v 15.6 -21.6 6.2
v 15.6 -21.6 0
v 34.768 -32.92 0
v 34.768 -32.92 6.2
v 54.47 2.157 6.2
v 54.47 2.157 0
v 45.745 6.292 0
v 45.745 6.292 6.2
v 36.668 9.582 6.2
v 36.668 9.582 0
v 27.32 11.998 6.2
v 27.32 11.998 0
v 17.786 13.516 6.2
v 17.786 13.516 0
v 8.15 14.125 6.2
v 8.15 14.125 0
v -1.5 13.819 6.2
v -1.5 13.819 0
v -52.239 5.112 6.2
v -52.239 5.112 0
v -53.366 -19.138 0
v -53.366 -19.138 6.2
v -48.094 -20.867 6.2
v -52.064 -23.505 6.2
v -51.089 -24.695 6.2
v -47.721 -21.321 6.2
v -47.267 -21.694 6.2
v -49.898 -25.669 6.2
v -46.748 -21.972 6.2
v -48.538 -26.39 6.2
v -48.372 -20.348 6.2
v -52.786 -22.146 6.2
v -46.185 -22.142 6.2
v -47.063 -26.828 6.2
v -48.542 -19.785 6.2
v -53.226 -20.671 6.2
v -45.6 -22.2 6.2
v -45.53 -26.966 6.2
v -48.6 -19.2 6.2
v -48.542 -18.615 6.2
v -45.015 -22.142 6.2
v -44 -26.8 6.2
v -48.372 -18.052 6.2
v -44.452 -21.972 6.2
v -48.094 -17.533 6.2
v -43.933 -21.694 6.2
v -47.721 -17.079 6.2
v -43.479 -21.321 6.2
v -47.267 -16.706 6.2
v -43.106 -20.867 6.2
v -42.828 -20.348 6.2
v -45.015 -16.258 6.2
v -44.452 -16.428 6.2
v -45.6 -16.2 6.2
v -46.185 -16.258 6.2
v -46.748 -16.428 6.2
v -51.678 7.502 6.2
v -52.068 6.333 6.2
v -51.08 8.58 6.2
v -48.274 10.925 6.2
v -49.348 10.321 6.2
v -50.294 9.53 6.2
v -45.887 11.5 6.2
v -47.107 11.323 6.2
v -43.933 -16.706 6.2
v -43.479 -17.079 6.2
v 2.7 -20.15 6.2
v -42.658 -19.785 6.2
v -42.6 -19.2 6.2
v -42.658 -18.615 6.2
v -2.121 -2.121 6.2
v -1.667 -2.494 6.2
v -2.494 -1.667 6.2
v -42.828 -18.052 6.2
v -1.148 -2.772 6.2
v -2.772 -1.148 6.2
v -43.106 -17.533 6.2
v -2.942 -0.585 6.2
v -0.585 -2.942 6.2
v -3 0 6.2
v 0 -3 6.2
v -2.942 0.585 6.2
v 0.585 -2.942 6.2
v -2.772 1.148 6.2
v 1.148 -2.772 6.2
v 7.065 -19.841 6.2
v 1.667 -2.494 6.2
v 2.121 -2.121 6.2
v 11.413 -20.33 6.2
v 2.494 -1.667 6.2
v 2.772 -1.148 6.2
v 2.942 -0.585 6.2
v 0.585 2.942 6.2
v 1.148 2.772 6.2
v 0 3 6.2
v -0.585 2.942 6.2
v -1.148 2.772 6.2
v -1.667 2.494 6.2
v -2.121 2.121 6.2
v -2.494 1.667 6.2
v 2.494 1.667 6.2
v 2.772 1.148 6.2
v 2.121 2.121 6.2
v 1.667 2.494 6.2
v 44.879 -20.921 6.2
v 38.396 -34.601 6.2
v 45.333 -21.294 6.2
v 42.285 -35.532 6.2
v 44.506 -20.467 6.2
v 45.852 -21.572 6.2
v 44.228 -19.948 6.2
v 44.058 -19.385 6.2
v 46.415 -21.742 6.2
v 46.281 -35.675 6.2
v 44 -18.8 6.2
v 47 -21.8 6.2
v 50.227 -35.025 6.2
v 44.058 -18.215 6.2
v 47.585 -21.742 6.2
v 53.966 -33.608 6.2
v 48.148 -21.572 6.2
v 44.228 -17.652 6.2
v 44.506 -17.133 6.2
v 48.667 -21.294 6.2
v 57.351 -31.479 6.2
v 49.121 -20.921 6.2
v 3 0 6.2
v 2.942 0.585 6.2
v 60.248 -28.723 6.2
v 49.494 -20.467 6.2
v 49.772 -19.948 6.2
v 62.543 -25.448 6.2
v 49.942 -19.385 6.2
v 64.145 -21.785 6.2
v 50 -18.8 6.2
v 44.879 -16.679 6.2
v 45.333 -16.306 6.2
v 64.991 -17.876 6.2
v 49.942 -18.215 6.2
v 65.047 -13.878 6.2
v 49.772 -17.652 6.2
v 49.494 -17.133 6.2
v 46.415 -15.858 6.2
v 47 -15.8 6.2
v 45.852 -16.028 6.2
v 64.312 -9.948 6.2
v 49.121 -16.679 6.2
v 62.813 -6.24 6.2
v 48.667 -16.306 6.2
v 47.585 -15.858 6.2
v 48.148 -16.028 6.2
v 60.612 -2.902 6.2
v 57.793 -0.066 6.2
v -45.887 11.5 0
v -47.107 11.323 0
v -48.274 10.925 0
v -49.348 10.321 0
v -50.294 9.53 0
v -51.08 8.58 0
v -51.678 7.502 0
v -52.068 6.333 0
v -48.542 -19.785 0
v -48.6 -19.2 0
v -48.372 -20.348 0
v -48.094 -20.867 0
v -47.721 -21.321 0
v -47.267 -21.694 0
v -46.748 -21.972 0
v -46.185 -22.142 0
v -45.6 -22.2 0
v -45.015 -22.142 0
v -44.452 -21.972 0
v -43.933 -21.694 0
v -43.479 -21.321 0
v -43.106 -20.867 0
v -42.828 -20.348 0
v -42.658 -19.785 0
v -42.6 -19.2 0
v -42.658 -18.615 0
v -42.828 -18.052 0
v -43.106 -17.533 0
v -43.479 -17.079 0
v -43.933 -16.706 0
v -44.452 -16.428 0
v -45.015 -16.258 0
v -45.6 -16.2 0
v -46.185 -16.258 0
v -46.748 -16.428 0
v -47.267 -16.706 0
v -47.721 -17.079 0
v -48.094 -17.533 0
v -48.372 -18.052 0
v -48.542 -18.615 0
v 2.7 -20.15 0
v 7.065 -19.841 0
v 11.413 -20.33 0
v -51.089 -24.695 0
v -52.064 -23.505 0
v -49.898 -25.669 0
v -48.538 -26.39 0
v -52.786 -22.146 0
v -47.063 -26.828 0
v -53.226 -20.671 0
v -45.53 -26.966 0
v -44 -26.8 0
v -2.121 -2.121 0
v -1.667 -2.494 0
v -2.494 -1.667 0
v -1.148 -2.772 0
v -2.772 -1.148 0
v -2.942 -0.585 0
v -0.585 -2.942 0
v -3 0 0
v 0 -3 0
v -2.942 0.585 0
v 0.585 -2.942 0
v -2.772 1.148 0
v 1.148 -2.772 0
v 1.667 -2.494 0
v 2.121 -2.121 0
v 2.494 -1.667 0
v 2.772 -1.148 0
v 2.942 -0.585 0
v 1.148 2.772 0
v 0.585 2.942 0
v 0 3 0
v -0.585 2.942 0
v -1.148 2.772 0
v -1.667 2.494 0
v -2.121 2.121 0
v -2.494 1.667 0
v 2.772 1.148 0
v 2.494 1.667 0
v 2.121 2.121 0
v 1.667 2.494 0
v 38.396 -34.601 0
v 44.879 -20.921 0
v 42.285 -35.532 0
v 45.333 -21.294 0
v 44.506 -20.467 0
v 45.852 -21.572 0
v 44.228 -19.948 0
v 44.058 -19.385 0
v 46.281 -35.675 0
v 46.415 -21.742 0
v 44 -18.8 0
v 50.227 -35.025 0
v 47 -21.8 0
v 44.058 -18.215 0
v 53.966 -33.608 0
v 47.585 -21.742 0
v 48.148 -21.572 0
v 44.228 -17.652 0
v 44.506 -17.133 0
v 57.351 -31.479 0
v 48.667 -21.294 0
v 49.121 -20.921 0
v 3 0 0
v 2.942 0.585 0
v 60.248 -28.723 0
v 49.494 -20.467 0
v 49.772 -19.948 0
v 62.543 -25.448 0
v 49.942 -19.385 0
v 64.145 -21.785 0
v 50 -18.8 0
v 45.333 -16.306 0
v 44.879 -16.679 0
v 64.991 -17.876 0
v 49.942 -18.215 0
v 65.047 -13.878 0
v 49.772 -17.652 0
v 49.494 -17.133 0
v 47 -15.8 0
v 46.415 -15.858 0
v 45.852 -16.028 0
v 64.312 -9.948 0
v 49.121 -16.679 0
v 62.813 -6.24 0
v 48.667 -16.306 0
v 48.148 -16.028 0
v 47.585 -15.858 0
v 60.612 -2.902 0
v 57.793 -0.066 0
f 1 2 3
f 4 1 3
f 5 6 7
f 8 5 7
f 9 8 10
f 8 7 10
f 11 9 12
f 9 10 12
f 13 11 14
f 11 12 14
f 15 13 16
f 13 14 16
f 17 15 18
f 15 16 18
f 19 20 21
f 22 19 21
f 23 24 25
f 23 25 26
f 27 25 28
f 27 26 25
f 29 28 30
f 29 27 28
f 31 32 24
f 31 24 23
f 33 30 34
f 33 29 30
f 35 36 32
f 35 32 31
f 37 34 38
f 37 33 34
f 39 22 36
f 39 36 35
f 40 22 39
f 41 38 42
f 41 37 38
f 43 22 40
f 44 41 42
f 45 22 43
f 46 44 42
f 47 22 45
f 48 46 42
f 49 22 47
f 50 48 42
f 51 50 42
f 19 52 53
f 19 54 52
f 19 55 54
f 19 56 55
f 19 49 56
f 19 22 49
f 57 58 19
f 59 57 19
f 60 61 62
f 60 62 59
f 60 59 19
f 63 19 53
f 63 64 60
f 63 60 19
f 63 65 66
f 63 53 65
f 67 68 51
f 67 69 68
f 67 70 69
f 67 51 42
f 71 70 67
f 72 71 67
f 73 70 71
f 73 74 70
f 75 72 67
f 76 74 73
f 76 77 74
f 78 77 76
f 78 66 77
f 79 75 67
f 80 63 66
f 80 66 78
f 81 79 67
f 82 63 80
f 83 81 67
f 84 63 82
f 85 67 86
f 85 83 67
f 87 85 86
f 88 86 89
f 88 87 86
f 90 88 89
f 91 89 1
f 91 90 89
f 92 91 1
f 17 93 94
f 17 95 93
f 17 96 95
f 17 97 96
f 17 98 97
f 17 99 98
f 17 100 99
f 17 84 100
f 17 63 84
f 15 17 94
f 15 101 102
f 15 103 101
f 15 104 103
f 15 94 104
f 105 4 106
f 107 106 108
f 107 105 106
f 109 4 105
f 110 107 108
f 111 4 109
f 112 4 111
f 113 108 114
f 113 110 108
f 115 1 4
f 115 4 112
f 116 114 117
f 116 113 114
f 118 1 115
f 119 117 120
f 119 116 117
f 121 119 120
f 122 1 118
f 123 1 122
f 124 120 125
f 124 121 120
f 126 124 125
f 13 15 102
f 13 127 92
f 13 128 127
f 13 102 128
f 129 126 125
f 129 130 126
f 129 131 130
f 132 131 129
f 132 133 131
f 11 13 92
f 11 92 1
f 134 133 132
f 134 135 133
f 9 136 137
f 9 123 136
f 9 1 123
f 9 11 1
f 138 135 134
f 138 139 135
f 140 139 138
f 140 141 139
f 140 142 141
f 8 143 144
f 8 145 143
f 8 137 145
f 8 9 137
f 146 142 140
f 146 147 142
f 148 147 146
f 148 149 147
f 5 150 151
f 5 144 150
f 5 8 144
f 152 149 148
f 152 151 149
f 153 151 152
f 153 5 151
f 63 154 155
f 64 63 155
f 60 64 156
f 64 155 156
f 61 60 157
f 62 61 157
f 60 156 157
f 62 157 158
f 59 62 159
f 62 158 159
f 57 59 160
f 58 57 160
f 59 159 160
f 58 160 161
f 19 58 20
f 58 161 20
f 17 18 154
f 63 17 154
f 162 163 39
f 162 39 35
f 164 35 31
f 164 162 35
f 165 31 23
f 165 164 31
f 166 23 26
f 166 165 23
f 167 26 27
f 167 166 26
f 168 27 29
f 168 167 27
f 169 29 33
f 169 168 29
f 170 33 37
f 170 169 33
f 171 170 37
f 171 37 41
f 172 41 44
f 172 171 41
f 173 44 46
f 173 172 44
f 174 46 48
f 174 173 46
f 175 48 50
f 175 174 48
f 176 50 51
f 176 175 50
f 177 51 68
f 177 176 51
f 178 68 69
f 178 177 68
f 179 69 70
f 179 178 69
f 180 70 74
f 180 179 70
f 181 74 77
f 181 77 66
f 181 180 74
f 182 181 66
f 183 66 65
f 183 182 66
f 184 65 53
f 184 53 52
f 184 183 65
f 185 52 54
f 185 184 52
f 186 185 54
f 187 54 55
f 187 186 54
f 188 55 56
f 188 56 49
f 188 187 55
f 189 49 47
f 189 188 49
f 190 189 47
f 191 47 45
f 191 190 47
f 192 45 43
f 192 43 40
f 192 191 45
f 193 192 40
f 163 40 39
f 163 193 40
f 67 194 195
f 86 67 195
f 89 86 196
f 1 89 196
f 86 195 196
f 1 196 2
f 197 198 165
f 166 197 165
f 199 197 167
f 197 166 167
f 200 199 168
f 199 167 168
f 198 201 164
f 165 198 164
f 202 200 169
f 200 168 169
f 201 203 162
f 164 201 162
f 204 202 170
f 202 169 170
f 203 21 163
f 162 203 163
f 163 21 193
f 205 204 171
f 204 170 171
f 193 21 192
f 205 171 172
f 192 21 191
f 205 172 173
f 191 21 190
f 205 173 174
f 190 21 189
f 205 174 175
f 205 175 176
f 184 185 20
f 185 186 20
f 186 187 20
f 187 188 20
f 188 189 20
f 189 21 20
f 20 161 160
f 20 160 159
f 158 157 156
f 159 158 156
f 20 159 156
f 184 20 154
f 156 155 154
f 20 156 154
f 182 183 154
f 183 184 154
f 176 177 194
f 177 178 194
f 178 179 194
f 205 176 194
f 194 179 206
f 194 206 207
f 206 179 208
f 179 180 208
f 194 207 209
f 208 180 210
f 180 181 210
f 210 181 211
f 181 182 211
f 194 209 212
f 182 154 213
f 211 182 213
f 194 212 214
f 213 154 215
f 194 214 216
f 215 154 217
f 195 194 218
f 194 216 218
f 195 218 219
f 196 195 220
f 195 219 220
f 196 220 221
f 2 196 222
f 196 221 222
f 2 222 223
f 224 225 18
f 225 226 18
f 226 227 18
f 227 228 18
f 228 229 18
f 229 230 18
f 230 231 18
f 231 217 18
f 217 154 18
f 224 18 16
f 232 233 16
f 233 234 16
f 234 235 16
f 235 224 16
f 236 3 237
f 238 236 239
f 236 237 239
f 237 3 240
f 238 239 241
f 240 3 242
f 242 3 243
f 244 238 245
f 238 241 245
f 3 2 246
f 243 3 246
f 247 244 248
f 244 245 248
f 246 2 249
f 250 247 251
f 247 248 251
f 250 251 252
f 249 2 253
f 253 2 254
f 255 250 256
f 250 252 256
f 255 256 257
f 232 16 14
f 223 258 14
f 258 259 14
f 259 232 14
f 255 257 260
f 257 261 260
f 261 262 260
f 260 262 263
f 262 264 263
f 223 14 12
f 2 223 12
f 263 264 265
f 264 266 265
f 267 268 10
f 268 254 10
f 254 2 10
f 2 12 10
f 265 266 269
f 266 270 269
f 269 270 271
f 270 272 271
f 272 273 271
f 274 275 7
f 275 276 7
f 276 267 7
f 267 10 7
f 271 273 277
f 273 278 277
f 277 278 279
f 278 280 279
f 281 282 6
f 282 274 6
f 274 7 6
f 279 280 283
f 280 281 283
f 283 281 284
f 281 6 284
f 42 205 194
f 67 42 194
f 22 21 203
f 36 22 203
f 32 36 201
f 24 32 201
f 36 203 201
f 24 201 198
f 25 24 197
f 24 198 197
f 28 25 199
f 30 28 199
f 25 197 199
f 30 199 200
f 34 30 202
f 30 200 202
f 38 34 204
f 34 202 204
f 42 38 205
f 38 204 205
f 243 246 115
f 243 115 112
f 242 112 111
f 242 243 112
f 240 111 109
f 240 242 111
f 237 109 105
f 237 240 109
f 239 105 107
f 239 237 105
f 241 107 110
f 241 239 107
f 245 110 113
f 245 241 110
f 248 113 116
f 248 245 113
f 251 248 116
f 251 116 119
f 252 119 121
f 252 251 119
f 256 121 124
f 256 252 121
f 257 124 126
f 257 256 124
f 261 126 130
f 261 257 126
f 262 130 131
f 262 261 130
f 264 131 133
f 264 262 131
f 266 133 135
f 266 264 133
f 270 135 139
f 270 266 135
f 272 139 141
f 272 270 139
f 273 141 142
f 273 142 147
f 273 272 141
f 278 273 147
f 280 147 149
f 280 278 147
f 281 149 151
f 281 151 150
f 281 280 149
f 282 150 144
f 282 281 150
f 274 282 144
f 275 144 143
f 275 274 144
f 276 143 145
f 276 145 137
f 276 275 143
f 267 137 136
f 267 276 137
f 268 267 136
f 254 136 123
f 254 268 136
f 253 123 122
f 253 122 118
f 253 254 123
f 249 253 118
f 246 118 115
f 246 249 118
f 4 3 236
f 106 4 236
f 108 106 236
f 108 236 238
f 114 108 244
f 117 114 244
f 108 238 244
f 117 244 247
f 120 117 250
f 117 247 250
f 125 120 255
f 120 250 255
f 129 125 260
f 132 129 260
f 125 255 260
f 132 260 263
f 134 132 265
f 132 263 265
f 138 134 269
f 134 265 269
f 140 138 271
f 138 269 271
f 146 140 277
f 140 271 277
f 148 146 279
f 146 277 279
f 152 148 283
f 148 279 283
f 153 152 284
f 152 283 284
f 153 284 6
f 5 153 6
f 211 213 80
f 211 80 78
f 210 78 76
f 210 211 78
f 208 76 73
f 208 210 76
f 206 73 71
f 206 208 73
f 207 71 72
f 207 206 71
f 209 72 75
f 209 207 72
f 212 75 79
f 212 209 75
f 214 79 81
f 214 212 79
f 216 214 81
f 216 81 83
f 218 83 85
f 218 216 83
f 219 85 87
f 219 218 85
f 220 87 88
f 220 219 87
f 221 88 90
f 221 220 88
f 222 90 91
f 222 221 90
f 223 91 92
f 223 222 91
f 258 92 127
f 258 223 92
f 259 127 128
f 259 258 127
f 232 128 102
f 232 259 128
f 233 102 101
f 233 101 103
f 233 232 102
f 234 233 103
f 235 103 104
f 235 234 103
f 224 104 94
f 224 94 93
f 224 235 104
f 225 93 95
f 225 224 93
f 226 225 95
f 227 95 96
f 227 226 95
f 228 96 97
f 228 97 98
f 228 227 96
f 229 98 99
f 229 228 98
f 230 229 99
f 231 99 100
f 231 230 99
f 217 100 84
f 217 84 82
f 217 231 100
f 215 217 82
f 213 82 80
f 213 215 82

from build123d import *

# Parameters (mm, degrees)
SKETCH1_R           = 3
BOSS_EXTRUDE1_DEPTH = 6.2


with BuildPart() as part:
    # Sketch1 → Boss-Extrude1 (new body)
    with BuildSketch(Plane.XY):
        with BuildLine():
            Line((-44, -26.8), (2.7, -20.15))
            ThreePointArc((2.7, -20.15), (9.249876076, -19.98611928), (15.6, -21.599705241))
            Line((15.6, -21.599705241), (34.768435899, -32.920104396))
            ThreePointArc((34.768435899, -32.920104396), (62.542861937, -25.448265408), (54.469609674, 2.157344845))
            ThreePointArc((54.469609674, 2.157344845), (27.320189876, 11.997539893), (-1.5, 13.818827736))
            Line((-1.5, 13.818827736), (-45.886645473, 11.5))
            ThreePointArc((-45.886645473, 11.5), (-50.294249478, 9.530490598), (-52.238519213, 5.111694886))
            Line((-52.238519213, 5.111694886), (-53.366350091, -19.138305114))
            ThreePointArc((-53.366350091, -19.138305114), (-50.517454676, -25.21154219), (-44, -26.8))
        make_face()
        with Locations(Location((47, -18.8, 0), (0, 0, 180))):
            Circle(SKETCH1_R, mode=Mode.SUBTRACT)
        with Locations(Location((-45.6, -19.2, 0), (0, 0, 180))):
            Circle(SKETCH1_R, mode=Mode.SUBTRACT)
        with Locations(Location((0, 0, 0), (0, 0, 180))):
            Circle(SKETCH1_R, mode=Mode.SUBTRACT)
    extrude(amount=BOSS_EXTRUDE1_DEPTH)


solid = part.part
